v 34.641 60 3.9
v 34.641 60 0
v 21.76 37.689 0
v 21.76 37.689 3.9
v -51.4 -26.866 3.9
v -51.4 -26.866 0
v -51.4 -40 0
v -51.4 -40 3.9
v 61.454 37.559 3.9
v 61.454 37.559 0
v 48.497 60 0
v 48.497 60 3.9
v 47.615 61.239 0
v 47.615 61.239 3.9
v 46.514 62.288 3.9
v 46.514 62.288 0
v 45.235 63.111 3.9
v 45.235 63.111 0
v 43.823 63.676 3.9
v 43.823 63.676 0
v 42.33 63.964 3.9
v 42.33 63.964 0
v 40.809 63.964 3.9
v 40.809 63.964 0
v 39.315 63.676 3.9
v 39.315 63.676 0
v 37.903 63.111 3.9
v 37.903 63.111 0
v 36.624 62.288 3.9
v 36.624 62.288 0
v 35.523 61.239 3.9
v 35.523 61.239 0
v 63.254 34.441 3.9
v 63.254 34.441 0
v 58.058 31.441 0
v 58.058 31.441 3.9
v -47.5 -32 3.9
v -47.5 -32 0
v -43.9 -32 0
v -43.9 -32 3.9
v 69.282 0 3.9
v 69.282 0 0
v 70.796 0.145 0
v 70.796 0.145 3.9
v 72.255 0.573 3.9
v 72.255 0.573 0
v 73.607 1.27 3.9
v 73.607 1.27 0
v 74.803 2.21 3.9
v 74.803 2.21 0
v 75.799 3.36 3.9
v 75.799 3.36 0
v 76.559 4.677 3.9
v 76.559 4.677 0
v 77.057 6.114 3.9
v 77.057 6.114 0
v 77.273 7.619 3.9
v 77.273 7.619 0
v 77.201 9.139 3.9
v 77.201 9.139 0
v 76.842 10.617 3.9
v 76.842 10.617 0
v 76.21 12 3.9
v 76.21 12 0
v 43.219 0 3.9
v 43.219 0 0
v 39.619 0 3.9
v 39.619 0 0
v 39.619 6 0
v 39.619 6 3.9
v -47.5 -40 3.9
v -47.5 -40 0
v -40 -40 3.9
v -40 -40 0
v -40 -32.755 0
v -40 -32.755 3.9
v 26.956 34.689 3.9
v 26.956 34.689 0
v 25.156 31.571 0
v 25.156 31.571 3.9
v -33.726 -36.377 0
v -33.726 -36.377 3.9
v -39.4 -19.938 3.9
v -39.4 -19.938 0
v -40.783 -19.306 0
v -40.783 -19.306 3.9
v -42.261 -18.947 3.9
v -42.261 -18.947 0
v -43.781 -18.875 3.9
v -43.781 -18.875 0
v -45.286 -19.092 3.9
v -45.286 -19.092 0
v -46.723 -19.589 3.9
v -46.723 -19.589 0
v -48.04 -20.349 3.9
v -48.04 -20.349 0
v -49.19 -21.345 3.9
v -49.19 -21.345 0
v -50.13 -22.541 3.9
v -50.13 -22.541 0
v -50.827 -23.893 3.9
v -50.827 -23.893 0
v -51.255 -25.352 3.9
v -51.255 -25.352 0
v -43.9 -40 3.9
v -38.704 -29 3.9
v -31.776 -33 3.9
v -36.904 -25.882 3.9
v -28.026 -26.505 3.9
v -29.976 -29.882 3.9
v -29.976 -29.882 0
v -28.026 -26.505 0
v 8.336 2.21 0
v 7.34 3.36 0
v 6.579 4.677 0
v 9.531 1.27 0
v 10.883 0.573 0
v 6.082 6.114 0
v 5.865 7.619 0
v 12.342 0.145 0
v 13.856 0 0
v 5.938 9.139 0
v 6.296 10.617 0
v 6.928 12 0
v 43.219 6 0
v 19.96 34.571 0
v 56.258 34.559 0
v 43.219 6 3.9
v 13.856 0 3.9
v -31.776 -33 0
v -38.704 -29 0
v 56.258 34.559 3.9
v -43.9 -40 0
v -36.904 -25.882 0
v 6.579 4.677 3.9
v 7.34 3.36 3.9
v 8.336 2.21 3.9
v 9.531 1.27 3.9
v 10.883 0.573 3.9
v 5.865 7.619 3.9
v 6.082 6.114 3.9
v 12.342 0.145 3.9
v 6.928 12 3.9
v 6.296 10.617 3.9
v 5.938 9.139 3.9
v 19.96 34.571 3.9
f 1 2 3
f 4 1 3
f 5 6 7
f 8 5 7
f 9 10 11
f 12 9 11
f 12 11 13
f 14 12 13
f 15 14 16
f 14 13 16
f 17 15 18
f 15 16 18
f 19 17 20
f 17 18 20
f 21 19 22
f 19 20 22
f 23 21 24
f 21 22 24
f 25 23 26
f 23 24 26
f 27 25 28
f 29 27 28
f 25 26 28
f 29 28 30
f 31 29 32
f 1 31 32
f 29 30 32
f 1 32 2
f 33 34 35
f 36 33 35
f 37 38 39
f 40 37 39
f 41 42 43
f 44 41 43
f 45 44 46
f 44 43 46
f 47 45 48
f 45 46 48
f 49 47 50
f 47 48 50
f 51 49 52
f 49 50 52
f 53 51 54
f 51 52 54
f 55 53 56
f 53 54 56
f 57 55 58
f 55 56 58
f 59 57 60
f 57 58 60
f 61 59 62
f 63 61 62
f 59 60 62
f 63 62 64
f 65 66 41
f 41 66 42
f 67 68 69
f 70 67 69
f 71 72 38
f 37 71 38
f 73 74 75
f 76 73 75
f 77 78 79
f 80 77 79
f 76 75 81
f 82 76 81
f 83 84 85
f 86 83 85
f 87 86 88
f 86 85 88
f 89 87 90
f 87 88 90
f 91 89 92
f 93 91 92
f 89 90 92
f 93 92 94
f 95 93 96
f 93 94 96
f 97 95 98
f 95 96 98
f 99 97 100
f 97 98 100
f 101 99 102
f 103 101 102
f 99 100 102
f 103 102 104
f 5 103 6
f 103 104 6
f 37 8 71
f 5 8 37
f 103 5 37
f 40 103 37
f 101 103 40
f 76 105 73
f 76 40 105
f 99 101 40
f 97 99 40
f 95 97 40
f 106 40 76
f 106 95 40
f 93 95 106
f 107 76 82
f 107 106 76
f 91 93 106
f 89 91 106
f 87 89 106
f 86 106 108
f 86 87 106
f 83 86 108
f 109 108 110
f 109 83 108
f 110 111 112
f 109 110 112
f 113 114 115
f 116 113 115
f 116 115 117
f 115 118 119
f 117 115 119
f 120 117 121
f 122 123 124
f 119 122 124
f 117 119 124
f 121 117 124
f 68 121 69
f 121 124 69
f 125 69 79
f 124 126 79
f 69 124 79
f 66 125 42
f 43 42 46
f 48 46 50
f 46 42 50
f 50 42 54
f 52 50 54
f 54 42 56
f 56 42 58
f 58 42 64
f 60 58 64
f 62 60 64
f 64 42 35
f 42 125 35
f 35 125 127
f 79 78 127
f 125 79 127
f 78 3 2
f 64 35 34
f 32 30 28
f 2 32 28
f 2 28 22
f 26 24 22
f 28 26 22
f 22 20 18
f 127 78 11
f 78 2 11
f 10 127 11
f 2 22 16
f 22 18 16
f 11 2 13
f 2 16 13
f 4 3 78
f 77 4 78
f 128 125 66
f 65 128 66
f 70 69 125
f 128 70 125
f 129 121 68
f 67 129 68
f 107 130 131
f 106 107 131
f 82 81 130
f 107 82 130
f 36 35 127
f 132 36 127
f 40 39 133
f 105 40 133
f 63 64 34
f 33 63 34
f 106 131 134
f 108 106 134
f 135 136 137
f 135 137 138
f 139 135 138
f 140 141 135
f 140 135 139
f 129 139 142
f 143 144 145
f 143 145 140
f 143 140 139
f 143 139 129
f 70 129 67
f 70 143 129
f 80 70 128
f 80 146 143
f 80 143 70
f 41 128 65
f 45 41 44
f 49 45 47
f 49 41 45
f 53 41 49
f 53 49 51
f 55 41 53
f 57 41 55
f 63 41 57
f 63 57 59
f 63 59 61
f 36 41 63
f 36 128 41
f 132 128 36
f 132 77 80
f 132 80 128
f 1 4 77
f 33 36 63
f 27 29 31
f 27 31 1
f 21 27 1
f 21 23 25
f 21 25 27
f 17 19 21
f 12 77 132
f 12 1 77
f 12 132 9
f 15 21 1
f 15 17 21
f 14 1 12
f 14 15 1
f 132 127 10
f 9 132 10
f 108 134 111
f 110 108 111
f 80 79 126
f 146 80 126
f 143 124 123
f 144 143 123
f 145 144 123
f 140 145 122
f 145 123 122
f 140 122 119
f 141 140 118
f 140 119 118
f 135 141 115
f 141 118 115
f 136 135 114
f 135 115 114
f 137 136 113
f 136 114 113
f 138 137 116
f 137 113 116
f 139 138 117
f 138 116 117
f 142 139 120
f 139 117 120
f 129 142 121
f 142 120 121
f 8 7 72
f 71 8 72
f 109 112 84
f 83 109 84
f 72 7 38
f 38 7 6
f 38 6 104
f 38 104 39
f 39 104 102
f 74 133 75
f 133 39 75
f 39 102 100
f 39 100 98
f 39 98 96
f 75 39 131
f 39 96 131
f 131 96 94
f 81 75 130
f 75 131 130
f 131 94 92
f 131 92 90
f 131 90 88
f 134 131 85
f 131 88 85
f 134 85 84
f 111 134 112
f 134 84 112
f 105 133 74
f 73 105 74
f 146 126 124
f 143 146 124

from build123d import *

# Parameters (mm, degrees)
F2_DEPTH = 3.9
F5_DEPTH = 3.9


with BuildPart() as f2:
    # F1 (on Top) → F2 (new body)
    with BuildSketch(Plane.XY):
        with BuildLine():
            ThreePointArc((6.9282032303, 12), (6.9282032303, 4), (13.8564064606, 0))
            Line((13.8564064606, 0), (39.6192193817, 0))
            Line((39.6192193817, 0), (39.6192193817, 6))
            Line((39.6192193817, 6), (43.2192193817, 6))
            Line((43.2192193817, 6), (43.2192193817, 0))
            Line((43.2192193817, 0), (69.2820323028, 0))
            ThreePointArc((69.2820323028, 0), (76.210235533, 4), (76.210235533, 12))
            Line((76.210235533, 12), (63.2538290725, 34.4411542732))
            Line((63.2538290725, 34.4411542732), (58.0576766498, 31.4411542732))
            Line((58.0576766498, 31.4411542732), (56.2576766498, 34.5588457268))
            Line((56.2576766498, 34.5588457268), (61.4538290725, 37.5588457268))
            Line((61.4538290725, 37.5588457268), (48.4974226119, 60))
            ThreePointArc((48.4974226119, 60), (41.5692193817, 64), (34.6410161514, 60))
            Line((34.6410161514, 60), (21.7596096908, 37.6887495374))
            Line((21.7596096908, 37.6887495374), (26.9557621135, 34.6887495374))
            Line((26.9557621135, 34.6887495374), (25.1557621135, 31.5710580838))
            Line((25.1557621135, 31.5710580838), (19.9596096908, 34.5710580838))
            Line((19.9596096908, 34.5710580838), (6.9282032303, 12))
        make_face()
    extrude(amount=F2_DEPTH)


with BuildPart() as f5:
    # F4 (on Top) → F5 (new body)
    with BuildSketch(Plane.XY):
        with BuildLine():
            Line((-43.9, -40), (-40, -40))
            Line((-40, -40), (-40, -32.7549981495))
            Line((-40, -32.7549981495), (-33.725644347, -36.3774990748))
            Line((-33.725644347, -36.3774990748), (-31.775644347, -33))
            Line((-31.775644347, -33), (-38.7038475773, -29))
            Line((-38.7038475773, -29), (-36.9038475773, -25.8823085464))
            Line((-36.9038475773, -25.8823085464), (-29.975644347, -29.8823085464))
            Line((-29.975644347, -29.8823085464), (-28.025644347, -26.5048094716))
            Line((-28.025644347, -26.5048094716), (-39.4, -19.9378221735))
            ThreePointArc((-39.4, -19.9378221735), (-47.4, -19.9378221735), (-51.4, -26.8660254038))
            Line((-51.4, -26.8660254038), (-51.4, -40))
            Line((-51.4, -40), (-47.5, -40))
            Line((-47.5, -40), (-47.5, -32))
            Line((-47.5, -32), (-43.9, -32))
            Line((-43.9, -32), (-43.9, -40))
        make_face()
    extrude(amount=F5_DEPTH)


solid = Compound([f2.part, f5.part])
